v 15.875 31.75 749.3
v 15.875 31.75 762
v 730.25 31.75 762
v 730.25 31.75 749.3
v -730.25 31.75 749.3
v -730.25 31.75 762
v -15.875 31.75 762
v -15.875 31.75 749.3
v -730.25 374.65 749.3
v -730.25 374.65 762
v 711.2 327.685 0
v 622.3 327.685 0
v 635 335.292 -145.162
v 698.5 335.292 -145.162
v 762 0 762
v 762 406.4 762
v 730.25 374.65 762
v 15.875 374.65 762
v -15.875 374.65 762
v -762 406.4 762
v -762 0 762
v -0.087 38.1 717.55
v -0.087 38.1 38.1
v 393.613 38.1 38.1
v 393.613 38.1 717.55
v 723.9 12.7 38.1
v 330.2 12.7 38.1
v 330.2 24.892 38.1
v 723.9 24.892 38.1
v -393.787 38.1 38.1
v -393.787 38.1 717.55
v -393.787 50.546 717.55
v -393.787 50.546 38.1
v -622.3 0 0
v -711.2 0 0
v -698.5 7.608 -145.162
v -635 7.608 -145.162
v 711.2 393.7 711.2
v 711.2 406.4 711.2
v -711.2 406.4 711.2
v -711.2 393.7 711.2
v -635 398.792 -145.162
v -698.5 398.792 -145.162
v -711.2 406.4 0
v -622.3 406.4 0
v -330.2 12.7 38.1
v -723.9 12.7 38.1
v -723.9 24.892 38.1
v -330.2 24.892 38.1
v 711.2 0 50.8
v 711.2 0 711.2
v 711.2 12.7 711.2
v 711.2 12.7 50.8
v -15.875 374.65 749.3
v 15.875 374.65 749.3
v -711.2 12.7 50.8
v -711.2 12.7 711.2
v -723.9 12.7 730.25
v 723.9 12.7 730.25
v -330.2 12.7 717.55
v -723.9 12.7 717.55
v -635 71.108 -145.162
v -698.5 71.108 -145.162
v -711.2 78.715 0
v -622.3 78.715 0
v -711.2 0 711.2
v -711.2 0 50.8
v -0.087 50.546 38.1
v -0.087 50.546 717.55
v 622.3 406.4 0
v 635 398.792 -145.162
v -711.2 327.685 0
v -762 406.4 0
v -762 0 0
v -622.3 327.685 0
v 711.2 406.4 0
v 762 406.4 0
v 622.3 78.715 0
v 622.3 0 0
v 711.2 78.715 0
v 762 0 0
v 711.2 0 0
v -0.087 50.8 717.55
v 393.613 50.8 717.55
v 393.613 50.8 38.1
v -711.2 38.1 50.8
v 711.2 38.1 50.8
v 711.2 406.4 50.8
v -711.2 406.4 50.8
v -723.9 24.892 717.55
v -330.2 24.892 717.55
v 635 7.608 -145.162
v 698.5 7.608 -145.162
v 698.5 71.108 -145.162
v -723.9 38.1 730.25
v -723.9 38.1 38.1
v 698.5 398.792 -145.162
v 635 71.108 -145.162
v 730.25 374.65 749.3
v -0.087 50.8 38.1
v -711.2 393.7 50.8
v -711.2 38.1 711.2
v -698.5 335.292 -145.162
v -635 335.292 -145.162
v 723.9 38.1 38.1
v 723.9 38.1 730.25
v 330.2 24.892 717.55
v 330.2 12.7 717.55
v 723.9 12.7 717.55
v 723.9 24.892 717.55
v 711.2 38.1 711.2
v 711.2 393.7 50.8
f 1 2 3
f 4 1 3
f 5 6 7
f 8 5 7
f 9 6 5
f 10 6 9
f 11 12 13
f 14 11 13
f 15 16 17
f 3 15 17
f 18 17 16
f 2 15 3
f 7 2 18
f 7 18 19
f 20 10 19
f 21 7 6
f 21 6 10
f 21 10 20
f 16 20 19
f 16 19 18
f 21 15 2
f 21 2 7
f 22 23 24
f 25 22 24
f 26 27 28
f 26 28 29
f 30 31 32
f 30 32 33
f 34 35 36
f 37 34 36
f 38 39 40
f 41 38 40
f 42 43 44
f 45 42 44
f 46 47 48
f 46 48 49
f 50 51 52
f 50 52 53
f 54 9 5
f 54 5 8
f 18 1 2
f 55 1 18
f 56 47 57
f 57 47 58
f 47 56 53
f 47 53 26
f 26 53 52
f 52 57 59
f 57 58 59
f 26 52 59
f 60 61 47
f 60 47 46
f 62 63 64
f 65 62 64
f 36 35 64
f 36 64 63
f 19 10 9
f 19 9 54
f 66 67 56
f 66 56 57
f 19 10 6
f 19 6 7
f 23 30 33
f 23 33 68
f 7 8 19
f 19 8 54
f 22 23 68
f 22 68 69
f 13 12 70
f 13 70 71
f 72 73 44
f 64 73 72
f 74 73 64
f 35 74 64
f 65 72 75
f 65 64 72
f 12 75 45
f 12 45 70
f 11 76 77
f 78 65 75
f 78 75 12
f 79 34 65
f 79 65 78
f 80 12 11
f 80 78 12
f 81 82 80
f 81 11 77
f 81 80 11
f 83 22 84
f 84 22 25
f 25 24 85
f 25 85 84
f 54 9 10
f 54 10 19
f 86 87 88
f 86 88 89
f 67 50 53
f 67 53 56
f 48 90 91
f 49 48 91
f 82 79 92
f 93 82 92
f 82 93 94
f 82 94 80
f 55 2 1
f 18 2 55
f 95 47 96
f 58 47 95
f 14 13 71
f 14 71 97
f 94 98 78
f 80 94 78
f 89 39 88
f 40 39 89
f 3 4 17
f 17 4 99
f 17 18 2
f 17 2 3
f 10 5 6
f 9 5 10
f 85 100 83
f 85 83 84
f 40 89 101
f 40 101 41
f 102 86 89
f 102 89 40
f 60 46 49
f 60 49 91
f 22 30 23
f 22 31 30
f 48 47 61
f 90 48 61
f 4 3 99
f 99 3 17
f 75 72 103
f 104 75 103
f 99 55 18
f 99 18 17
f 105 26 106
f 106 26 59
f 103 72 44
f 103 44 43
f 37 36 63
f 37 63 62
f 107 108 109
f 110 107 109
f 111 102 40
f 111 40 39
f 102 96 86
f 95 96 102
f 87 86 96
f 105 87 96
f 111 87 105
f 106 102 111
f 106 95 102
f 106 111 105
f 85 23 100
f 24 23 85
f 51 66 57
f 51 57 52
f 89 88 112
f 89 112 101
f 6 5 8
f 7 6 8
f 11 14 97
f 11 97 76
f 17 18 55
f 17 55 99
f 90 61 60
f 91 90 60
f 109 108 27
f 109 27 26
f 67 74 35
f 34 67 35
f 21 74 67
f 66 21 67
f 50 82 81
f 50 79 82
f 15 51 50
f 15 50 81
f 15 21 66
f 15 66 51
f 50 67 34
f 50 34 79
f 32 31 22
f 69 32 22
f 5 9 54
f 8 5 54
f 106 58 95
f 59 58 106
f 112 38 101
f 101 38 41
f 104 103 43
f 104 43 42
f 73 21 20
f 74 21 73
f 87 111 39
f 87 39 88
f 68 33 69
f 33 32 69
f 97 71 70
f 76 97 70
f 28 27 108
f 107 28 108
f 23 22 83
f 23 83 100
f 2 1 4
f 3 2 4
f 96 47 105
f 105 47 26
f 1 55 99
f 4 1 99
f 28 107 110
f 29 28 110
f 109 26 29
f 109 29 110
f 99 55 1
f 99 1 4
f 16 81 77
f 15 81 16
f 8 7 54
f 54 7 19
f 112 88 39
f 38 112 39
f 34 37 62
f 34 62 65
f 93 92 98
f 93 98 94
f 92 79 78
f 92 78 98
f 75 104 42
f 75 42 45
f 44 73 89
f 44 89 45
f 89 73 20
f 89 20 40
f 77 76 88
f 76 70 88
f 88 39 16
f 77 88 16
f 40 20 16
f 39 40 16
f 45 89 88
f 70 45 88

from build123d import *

# Parameters (mm, degrees)
F1_DEPTH  = 406.4
F3_W      = 1422.4
F3_H      = 660.4
F4_DEPTH  = 12.7
F6_W      = 1447.8
F6_H      = 692.15
F7_DEPTH  = 25.4
F8_W      = 393.7
F8_H      = 679.45
F9_DEPTH  = 12.192
F10_W     = 393.7
F10_H     = 12.7
F10_H_2   = 660.4
F10_H_3   = 6.35
F11_DEPTH = 12.446
F12_DEPTH = 12.7
F14_DEPTH = 1524.001
F15_W     = 714.375
F15_H     = 342.9
F16_DEPTH = 12.7
F17_DEPTH = 12.7


with BuildPart() as f1:
    # F0 (on Front) → F1 (new body)
    with BuildSketch(Plane.XZ):
        Polygon((-622.3, 0), (0, 0), (622.3, 0), (711.2, 0), (762, 0), (762, 762), (0, 762), (-762, 762), (-762, 0), (-711.2, 0), align=None)
        Polygon((-711.2, 711.2), (0, 711.2), (711.2, 711.2), (711.2, 495.3), (711.2, 473.075), (711.2, 288.925), (711.2, 266.7), (711.2, 50.8), (0, 50.8), (-711.2, 50.8), (-711.2, 266.7), (-711.2, 288.925), (-711.2, 473.075), (-711.2, 495.3), align=None, mode=Mode.SUBTRACT)
        Polygon((711.2, 0), (622.3, 0), (635, -145.1616642451), (698.5, -145.1616642451), align=None)
        Polygon((-635, -145.1616642451), (-622.3, 0), (-711.2, 0), (-698.5, -145.1616642451), align=None)
    extrude(amount=-F1_DEPTH)

    # F6 (on offset) → F7 (cut)
    with BuildSketch(Plane.XZ.offset(-12.7)):
        with Locations((0, 384.175)):
            Rectangle(F6_W, F6_H)
    extrude(amount=-F7_DEPTH, mode=Mode.SUBTRACT)

    # F13 (on face) → F14 (cut, through all)
    with BuildSketch(Plane(origin=(-762, 0, 0), x_dir=(0, -1, 0), z_dir=(-1, 0, 0))):
        Polygon((113.1209731102, 0), (0, 0), (-7.6076004601, -145.1616642451), (-71.1076004601, -145.1616642451), (-78.7152009202, 0), (-327.6847990798, 0), (-335.2923995399, -145.1616642451), (-398.7923995399, -145.1616642451), (-406.4, 0), (-529.3149352074, 0), (-529.3149352074, -225.6401926279), (113.1209731102, -225.6401926279), align=None)
    extrude(amount=-F14_DEPTH, mode=Mode.SUBTRACT)

    # F15 (on face) → F16 (cut)
    with BuildSketch(Plane.XY.offset(762)):
        with Locations((-373.0625, 203.2)):
            Rectangle(F15_W, F15_H)
        with Locations((373.0625, 203.2)):
            Rectangle(F15_W, F15_H)
    extrude(amount=-F16_DEPTH, mode=Mode.SUBTRACT)


with BuildPart() as f4:
    # F3 (on offset) → F4 (new body)
    with BuildSketch(Plane(origin=(0, 406.4, 0), x_dir=(-1, 0, 0), z_dir=(0, 1, 0))):
        with Locations((0, 381)):
            Rectangle(F3_W, F3_H)
    extrude(amount=-F4_DEPTH)


with BuildPart() as f9:
    # F8 (on offset) → F9 (new body)
    with BuildSketch(Plane.XZ.offset(-12.7)):
        with Locations((-527.05, 377.825)):
            Rectangle(F8_W, F8_H)
    extrude(amount=-F9_DEPTH)


with BuildPart() as f9b:
    # F8 (on offset) → F9, piece 2 (new body)
    with BuildSketch(Plane.XZ.offset(-12.7)):
        with Locations((527.05, 377.825)):
            Rectangle(F8_W, F8_H)
    extrude(amount=-F9_DEPTH)


with BuildPart() as f11:
    # F10 (on face) → F11 (new body)
    with BuildSketch(Plane.XZ.offset(-38.1)):
        with Locations((-196.9368773937, 44.45)):
            Rectangle(F10_W, F10_H)
        with Locations((-196.9368773937, 381)):
            Rectangle(F10_W, F10_H_2)
        with Locations((-196.9368773937, 714.375)):
            Rectangle(F10_W, F10_H_3)
    extrude(amount=-F11_DEPTH)


with BuildPart() as f12:
    # F10 (on face) → F12 (new body)
    with BuildSketch(Plane.XZ.offset(-38.1)):
        with Locations((196.7631226063, 381)):
            Rectangle(F10_W, F10_H_2)
        with Locations((196.7631226063, 714.375)):
            Rectangle(F10_W, F10_H_3)
        with Locations((196.7631226063, 44.45)):
            Rectangle(F10_W, F10_H)
    extrude(amount=-F12_DEPTH)


with BuildPart() as f17:
    # F17 (new): a face of the model
    f17_faces = [f1.part.faces().sort_by_distance(p)[0] for p in [
        (-373.0625, 203.2, 749.3),
    ]]
    extrude(f17_faces, amount=F17_DEPTH)


with BuildPart() as f17b:
    # F17#2 (new): a face of the model
    f17_2_faces = [f1.part.faces().sort_by_distance(p)[0] for p in [
        (373.0625, 203.2, 749.3),
    ]]
    extrude(f17_2_faces, amount=F17_DEPTH)


solid = Compound([f1.part, f4.part, f9.part, f9b.part, f11.part, f12.part, f17.part, f17b.part])
